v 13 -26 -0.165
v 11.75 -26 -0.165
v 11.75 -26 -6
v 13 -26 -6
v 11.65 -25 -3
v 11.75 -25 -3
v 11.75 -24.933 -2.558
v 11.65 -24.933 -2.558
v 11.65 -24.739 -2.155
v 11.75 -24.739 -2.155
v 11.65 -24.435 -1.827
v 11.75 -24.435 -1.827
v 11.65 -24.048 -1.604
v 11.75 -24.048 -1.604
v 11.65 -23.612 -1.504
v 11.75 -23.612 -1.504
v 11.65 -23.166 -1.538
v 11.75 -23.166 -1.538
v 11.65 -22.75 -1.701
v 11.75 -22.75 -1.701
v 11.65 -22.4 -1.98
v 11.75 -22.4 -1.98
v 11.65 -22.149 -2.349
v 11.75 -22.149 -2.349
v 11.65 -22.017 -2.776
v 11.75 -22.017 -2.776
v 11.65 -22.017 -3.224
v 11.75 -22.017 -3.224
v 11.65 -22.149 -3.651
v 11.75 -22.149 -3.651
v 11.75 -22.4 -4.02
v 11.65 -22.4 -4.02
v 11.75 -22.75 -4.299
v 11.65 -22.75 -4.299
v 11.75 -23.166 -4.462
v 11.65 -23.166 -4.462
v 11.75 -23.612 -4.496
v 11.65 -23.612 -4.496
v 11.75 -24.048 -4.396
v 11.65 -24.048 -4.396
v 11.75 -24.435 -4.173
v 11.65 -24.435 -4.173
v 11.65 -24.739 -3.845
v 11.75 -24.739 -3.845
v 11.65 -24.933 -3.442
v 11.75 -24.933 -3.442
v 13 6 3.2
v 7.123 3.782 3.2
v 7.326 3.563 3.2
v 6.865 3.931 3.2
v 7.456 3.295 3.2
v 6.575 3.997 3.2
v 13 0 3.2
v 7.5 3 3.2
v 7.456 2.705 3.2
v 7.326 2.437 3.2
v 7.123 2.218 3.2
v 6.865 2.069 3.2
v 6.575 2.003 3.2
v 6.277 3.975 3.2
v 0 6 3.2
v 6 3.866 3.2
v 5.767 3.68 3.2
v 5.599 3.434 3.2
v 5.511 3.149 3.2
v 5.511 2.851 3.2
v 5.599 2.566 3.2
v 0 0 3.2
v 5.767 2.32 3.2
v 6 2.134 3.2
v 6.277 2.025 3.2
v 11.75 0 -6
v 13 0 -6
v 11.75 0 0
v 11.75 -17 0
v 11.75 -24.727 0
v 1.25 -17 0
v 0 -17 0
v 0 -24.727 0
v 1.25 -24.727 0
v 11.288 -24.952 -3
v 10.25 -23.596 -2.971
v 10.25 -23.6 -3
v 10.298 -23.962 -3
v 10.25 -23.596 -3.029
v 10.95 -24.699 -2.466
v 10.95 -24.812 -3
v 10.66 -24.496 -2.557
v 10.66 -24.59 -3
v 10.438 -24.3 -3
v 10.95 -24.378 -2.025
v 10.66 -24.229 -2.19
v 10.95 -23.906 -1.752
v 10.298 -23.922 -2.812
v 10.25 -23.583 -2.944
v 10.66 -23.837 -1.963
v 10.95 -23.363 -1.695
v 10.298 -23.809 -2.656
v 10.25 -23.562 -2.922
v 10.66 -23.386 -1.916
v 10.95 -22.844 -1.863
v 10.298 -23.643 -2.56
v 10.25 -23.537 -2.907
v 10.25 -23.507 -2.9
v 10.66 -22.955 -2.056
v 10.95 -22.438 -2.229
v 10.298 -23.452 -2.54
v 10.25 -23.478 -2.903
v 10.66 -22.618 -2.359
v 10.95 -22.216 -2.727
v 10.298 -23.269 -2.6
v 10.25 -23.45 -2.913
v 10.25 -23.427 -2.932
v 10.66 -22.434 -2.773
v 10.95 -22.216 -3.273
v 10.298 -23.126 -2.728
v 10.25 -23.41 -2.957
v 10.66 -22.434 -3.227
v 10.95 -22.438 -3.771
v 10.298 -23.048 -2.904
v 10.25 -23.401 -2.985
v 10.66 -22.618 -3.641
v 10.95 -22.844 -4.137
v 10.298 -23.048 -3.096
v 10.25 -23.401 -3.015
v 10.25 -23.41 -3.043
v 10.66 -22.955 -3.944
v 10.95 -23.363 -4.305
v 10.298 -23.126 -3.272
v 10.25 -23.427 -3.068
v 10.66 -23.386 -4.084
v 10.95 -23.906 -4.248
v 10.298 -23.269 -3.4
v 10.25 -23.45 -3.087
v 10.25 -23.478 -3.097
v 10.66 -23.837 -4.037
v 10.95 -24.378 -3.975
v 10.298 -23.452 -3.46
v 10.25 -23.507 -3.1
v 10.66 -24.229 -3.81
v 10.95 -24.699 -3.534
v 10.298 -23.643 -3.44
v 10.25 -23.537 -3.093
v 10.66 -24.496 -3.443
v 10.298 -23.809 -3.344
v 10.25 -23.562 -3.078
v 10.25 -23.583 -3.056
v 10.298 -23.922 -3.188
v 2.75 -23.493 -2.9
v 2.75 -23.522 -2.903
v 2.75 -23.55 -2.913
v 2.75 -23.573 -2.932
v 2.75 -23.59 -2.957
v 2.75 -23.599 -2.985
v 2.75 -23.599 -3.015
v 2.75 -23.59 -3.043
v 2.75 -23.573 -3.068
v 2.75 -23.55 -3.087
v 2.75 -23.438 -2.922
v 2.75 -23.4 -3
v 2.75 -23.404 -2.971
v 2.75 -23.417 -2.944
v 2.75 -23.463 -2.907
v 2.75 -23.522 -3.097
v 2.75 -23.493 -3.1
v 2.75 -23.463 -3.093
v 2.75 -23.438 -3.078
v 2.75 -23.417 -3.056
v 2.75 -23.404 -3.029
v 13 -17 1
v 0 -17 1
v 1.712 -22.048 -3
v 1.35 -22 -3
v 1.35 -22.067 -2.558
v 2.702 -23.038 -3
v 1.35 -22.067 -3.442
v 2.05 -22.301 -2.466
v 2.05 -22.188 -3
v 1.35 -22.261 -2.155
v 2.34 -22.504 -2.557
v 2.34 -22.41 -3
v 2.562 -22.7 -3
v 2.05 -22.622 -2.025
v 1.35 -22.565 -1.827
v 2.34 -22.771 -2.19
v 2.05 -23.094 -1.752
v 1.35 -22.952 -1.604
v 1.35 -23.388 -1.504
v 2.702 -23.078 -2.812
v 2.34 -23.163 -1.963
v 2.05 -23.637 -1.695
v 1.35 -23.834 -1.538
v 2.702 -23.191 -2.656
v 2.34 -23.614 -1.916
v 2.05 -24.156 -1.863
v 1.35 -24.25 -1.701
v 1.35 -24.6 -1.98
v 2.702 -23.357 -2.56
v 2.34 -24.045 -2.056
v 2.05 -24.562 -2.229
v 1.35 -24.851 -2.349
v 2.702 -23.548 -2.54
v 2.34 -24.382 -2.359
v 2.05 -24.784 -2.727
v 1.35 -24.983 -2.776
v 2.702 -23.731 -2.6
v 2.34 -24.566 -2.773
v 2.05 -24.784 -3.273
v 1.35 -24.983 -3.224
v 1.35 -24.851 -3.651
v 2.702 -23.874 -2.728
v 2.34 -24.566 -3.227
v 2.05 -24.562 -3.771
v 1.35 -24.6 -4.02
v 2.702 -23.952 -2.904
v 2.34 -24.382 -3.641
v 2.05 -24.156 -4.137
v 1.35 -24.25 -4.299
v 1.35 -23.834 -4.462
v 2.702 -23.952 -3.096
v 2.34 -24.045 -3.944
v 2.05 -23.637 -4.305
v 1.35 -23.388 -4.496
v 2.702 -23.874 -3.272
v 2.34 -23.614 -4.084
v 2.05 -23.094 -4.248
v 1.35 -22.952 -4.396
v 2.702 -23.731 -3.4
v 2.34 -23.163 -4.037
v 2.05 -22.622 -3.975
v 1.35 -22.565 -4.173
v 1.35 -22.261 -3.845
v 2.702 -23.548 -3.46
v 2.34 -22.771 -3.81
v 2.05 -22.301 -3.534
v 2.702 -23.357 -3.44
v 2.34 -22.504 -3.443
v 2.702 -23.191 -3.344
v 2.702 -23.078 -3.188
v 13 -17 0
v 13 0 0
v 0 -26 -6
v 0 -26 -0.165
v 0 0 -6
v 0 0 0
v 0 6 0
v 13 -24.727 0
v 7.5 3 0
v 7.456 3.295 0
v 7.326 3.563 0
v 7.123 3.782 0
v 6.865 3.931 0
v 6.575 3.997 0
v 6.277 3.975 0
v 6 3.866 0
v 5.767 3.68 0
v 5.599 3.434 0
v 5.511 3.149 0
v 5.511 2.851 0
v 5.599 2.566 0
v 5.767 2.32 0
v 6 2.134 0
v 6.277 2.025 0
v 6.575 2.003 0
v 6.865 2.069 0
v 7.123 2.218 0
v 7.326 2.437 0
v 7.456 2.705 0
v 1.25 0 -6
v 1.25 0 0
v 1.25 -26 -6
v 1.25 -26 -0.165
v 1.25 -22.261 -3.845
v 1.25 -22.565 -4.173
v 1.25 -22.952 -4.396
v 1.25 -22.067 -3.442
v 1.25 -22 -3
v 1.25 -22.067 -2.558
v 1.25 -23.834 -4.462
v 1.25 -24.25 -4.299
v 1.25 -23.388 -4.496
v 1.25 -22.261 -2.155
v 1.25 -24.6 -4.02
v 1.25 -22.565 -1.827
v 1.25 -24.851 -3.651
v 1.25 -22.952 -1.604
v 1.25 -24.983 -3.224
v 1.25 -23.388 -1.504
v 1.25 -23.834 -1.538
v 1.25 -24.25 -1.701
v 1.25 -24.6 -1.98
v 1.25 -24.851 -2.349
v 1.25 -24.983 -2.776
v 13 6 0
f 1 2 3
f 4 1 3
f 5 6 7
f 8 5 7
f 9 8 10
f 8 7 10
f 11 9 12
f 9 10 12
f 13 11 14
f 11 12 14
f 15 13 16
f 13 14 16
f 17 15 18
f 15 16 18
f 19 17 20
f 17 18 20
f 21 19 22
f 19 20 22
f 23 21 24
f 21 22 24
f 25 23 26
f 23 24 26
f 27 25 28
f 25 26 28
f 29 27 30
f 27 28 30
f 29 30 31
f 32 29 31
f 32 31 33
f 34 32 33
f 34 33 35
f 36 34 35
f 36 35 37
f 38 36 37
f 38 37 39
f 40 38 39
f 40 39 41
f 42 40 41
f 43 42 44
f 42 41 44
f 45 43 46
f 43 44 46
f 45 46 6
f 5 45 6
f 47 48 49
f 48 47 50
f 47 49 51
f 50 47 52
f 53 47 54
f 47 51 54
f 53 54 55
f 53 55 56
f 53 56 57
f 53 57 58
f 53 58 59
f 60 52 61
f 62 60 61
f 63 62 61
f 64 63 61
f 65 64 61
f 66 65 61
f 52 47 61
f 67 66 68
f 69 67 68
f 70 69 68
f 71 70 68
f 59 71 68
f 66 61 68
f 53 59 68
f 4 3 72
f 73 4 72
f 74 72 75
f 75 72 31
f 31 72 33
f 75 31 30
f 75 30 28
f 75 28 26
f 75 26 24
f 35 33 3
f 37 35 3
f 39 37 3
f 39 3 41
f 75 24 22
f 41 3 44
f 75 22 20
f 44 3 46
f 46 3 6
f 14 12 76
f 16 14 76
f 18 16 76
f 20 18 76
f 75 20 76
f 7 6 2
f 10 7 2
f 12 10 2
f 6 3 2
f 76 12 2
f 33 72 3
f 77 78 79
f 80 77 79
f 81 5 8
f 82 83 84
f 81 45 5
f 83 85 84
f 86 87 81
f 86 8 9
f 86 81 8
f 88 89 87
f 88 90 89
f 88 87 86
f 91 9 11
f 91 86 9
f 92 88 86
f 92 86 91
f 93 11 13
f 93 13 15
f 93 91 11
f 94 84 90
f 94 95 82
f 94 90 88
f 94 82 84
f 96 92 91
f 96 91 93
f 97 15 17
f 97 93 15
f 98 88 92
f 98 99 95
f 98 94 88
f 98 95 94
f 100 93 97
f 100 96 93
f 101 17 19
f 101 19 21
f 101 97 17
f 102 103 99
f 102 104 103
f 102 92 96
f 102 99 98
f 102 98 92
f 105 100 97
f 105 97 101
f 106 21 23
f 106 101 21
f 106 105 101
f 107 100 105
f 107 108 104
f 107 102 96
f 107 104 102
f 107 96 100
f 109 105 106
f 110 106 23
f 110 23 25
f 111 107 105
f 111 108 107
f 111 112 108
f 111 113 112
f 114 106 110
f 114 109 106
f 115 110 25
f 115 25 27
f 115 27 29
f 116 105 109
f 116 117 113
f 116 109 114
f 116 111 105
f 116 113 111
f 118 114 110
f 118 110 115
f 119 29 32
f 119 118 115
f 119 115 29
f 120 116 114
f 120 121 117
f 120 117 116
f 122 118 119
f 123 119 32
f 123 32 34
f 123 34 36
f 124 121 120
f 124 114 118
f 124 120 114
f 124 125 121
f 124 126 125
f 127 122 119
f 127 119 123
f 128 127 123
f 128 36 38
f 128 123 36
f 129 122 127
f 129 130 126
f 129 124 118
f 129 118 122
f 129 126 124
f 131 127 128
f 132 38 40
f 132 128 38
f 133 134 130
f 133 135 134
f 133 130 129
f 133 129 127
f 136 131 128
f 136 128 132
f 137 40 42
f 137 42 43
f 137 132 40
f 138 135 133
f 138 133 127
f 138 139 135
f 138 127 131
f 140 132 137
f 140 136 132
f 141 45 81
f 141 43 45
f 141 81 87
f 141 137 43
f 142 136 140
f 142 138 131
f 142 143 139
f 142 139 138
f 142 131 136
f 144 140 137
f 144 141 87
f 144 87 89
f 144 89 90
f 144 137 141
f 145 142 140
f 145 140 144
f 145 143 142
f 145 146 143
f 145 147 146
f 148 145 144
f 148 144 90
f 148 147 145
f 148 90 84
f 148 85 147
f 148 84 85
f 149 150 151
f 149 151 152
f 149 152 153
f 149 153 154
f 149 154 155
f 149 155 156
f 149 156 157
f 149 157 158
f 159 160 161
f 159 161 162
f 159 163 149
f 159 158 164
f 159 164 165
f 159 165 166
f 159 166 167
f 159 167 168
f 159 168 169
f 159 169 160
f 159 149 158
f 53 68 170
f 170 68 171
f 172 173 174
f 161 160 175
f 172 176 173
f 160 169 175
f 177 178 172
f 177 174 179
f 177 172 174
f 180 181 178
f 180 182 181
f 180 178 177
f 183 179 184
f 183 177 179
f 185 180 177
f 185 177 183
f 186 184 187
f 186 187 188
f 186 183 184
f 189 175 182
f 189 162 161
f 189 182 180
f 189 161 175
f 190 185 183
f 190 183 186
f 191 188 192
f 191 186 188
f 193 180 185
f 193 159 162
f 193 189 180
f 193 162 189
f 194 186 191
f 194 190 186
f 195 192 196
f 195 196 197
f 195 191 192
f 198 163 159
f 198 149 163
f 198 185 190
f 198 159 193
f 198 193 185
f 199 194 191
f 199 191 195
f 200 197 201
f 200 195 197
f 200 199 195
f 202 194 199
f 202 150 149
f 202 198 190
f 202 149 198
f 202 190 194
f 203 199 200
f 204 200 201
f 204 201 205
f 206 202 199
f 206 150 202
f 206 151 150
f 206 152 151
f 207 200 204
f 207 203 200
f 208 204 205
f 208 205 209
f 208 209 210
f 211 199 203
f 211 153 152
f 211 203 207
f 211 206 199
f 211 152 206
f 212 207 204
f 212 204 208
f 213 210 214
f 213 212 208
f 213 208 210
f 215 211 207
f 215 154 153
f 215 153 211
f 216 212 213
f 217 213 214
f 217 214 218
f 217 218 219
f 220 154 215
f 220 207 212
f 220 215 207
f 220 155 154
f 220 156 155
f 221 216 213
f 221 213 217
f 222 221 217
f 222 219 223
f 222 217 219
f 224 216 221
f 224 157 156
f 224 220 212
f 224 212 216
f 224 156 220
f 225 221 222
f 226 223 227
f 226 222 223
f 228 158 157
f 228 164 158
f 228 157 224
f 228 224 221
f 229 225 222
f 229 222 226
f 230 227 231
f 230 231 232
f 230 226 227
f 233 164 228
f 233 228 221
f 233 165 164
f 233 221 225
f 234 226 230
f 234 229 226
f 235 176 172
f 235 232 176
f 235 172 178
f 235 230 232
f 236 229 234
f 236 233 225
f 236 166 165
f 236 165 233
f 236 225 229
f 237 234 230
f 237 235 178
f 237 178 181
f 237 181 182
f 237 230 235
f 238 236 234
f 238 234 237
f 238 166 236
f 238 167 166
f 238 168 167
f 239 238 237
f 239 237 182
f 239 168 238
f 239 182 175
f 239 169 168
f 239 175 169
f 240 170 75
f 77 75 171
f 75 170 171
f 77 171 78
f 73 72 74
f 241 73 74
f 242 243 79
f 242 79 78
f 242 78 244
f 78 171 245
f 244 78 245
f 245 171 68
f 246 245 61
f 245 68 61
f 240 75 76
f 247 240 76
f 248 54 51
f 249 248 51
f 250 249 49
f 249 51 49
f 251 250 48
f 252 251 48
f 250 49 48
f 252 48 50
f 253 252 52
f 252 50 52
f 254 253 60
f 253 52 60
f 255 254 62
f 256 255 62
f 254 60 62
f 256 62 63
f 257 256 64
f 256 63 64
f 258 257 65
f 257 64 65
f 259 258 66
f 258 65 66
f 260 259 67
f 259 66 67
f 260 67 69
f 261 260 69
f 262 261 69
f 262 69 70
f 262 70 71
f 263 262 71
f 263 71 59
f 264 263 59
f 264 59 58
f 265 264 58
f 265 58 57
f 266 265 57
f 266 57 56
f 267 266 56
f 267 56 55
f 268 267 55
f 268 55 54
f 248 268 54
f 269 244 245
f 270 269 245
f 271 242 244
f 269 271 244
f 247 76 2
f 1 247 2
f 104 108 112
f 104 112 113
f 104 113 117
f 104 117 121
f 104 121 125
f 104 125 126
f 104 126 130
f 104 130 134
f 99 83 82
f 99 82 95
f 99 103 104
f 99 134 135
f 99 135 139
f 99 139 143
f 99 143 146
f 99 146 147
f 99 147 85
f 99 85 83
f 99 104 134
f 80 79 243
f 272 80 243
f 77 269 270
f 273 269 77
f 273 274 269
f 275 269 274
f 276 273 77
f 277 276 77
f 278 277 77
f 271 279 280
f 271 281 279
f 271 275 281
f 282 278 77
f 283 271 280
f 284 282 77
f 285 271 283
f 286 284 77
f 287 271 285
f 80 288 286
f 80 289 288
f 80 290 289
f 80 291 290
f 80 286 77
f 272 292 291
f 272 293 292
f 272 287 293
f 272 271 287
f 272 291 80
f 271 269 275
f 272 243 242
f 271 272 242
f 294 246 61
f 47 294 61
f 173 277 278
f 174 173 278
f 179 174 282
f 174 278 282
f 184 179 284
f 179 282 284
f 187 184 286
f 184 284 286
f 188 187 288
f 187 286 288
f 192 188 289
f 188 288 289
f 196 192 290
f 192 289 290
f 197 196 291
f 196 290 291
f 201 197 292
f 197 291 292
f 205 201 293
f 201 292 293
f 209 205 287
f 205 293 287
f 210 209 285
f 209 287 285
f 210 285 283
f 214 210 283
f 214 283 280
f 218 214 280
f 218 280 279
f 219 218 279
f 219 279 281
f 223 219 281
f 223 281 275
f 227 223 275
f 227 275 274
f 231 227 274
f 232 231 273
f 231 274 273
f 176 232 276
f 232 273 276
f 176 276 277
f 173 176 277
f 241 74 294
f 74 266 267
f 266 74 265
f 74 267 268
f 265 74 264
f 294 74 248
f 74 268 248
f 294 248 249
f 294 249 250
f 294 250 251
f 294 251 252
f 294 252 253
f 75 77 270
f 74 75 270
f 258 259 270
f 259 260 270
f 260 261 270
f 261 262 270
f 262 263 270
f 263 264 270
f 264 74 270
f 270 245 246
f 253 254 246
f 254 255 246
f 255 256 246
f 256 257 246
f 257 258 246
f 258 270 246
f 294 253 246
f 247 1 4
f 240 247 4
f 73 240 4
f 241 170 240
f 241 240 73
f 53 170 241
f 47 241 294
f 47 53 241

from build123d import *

# Parameters (mm, degrees)
F1_DEPTH  = 13
F2_R      = 1
F3_DEPTH  = 9.201
F4_W      = 10.5
F4_H      = 6
F5_DEPTH  = 32.001
F6_R      = 1.5
F7_DEPTH  = 1.5
F8_R      = 1.4
F9_R      = 1.5
F10_DEPTH = 1.5
F11_R     = 1.4
F13_DEPTH = 13.001


with BuildPart() as f1:
    # F0 (on Right) → F1 (new body)
    with BuildSketch(Plane.YZ):
        Polygon((0, -6), (0, 0), (-17, 0), (-26, 0), (-26, -6), align=None)
        Polygon((-17, 0), (0, 0), (6, 0), (6, 3.2), (0, 3.2), (-17, 1), align=None)
    extrude(amount=F1_DEPTH)

    # F2 (on face) → F3 (cut, through all)
    with BuildSketch(Plane.XY.offset(3.2)):
        with Locations((6.5, 3.0000000261)):
            Circle(F2_R)
    extrude(amount=-F3_DEPTH, mode=Mode.SUBTRACT)

    # F4 (on face) → F5 (cut, through all)
    with BuildSketch(Plane.XZ.offset(26)):
        with Locations((6.5, -3)):
            Rectangle(F4_W, F4_H)
    extrude(amount=-F5_DEPTH, mode=Mode.SUBTRACT)

    # F6 (on face) → F7 (join)
    with BuildSketch(Plane.YZ.offset(1.25)):
        with Locations((-23.5, -3)):
            Circle(F6_R)
    extrude(amount=F7_DEPTH)

    # F8
    f8_edges = [f1.edges().sort_by_distance(p)[0] for p in [
        (2.75, -25, -3),
    ]]
    fillet(f8_edges, radius=F8_R)

    # F9 (on face) → F10 (join)
    with BuildSketch(Plane(origin=(11.75, 0, 0), x_dir=(0, -1, 0), z_dir=(-1, 0, 0))):
        with Locations((23.5, -3)):
            Circle(F9_R)
    extrude(amount=F10_DEPTH)

    # F11
    f11_edges = [f1.edges().sort_by_distance(p)[0] for p in [
        (10.25, -22, -3),
    ]]
    fillet(f11_edges, radius=F11_R)

    # F12 (on face) → F13 (cut, through all)
    with BuildSketch(Plane(origin=(0, 0, 0), x_dir=(0, -1, 0), z_dir=(-1, 0, 0))):
        Polygon((26, 0), (24.7272727273, 0), (26, -0.1647058824), align=None)
    extrude(amount=-F13_DEPTH, mode=Mode.SUBTRACT)


solid = f1.part
